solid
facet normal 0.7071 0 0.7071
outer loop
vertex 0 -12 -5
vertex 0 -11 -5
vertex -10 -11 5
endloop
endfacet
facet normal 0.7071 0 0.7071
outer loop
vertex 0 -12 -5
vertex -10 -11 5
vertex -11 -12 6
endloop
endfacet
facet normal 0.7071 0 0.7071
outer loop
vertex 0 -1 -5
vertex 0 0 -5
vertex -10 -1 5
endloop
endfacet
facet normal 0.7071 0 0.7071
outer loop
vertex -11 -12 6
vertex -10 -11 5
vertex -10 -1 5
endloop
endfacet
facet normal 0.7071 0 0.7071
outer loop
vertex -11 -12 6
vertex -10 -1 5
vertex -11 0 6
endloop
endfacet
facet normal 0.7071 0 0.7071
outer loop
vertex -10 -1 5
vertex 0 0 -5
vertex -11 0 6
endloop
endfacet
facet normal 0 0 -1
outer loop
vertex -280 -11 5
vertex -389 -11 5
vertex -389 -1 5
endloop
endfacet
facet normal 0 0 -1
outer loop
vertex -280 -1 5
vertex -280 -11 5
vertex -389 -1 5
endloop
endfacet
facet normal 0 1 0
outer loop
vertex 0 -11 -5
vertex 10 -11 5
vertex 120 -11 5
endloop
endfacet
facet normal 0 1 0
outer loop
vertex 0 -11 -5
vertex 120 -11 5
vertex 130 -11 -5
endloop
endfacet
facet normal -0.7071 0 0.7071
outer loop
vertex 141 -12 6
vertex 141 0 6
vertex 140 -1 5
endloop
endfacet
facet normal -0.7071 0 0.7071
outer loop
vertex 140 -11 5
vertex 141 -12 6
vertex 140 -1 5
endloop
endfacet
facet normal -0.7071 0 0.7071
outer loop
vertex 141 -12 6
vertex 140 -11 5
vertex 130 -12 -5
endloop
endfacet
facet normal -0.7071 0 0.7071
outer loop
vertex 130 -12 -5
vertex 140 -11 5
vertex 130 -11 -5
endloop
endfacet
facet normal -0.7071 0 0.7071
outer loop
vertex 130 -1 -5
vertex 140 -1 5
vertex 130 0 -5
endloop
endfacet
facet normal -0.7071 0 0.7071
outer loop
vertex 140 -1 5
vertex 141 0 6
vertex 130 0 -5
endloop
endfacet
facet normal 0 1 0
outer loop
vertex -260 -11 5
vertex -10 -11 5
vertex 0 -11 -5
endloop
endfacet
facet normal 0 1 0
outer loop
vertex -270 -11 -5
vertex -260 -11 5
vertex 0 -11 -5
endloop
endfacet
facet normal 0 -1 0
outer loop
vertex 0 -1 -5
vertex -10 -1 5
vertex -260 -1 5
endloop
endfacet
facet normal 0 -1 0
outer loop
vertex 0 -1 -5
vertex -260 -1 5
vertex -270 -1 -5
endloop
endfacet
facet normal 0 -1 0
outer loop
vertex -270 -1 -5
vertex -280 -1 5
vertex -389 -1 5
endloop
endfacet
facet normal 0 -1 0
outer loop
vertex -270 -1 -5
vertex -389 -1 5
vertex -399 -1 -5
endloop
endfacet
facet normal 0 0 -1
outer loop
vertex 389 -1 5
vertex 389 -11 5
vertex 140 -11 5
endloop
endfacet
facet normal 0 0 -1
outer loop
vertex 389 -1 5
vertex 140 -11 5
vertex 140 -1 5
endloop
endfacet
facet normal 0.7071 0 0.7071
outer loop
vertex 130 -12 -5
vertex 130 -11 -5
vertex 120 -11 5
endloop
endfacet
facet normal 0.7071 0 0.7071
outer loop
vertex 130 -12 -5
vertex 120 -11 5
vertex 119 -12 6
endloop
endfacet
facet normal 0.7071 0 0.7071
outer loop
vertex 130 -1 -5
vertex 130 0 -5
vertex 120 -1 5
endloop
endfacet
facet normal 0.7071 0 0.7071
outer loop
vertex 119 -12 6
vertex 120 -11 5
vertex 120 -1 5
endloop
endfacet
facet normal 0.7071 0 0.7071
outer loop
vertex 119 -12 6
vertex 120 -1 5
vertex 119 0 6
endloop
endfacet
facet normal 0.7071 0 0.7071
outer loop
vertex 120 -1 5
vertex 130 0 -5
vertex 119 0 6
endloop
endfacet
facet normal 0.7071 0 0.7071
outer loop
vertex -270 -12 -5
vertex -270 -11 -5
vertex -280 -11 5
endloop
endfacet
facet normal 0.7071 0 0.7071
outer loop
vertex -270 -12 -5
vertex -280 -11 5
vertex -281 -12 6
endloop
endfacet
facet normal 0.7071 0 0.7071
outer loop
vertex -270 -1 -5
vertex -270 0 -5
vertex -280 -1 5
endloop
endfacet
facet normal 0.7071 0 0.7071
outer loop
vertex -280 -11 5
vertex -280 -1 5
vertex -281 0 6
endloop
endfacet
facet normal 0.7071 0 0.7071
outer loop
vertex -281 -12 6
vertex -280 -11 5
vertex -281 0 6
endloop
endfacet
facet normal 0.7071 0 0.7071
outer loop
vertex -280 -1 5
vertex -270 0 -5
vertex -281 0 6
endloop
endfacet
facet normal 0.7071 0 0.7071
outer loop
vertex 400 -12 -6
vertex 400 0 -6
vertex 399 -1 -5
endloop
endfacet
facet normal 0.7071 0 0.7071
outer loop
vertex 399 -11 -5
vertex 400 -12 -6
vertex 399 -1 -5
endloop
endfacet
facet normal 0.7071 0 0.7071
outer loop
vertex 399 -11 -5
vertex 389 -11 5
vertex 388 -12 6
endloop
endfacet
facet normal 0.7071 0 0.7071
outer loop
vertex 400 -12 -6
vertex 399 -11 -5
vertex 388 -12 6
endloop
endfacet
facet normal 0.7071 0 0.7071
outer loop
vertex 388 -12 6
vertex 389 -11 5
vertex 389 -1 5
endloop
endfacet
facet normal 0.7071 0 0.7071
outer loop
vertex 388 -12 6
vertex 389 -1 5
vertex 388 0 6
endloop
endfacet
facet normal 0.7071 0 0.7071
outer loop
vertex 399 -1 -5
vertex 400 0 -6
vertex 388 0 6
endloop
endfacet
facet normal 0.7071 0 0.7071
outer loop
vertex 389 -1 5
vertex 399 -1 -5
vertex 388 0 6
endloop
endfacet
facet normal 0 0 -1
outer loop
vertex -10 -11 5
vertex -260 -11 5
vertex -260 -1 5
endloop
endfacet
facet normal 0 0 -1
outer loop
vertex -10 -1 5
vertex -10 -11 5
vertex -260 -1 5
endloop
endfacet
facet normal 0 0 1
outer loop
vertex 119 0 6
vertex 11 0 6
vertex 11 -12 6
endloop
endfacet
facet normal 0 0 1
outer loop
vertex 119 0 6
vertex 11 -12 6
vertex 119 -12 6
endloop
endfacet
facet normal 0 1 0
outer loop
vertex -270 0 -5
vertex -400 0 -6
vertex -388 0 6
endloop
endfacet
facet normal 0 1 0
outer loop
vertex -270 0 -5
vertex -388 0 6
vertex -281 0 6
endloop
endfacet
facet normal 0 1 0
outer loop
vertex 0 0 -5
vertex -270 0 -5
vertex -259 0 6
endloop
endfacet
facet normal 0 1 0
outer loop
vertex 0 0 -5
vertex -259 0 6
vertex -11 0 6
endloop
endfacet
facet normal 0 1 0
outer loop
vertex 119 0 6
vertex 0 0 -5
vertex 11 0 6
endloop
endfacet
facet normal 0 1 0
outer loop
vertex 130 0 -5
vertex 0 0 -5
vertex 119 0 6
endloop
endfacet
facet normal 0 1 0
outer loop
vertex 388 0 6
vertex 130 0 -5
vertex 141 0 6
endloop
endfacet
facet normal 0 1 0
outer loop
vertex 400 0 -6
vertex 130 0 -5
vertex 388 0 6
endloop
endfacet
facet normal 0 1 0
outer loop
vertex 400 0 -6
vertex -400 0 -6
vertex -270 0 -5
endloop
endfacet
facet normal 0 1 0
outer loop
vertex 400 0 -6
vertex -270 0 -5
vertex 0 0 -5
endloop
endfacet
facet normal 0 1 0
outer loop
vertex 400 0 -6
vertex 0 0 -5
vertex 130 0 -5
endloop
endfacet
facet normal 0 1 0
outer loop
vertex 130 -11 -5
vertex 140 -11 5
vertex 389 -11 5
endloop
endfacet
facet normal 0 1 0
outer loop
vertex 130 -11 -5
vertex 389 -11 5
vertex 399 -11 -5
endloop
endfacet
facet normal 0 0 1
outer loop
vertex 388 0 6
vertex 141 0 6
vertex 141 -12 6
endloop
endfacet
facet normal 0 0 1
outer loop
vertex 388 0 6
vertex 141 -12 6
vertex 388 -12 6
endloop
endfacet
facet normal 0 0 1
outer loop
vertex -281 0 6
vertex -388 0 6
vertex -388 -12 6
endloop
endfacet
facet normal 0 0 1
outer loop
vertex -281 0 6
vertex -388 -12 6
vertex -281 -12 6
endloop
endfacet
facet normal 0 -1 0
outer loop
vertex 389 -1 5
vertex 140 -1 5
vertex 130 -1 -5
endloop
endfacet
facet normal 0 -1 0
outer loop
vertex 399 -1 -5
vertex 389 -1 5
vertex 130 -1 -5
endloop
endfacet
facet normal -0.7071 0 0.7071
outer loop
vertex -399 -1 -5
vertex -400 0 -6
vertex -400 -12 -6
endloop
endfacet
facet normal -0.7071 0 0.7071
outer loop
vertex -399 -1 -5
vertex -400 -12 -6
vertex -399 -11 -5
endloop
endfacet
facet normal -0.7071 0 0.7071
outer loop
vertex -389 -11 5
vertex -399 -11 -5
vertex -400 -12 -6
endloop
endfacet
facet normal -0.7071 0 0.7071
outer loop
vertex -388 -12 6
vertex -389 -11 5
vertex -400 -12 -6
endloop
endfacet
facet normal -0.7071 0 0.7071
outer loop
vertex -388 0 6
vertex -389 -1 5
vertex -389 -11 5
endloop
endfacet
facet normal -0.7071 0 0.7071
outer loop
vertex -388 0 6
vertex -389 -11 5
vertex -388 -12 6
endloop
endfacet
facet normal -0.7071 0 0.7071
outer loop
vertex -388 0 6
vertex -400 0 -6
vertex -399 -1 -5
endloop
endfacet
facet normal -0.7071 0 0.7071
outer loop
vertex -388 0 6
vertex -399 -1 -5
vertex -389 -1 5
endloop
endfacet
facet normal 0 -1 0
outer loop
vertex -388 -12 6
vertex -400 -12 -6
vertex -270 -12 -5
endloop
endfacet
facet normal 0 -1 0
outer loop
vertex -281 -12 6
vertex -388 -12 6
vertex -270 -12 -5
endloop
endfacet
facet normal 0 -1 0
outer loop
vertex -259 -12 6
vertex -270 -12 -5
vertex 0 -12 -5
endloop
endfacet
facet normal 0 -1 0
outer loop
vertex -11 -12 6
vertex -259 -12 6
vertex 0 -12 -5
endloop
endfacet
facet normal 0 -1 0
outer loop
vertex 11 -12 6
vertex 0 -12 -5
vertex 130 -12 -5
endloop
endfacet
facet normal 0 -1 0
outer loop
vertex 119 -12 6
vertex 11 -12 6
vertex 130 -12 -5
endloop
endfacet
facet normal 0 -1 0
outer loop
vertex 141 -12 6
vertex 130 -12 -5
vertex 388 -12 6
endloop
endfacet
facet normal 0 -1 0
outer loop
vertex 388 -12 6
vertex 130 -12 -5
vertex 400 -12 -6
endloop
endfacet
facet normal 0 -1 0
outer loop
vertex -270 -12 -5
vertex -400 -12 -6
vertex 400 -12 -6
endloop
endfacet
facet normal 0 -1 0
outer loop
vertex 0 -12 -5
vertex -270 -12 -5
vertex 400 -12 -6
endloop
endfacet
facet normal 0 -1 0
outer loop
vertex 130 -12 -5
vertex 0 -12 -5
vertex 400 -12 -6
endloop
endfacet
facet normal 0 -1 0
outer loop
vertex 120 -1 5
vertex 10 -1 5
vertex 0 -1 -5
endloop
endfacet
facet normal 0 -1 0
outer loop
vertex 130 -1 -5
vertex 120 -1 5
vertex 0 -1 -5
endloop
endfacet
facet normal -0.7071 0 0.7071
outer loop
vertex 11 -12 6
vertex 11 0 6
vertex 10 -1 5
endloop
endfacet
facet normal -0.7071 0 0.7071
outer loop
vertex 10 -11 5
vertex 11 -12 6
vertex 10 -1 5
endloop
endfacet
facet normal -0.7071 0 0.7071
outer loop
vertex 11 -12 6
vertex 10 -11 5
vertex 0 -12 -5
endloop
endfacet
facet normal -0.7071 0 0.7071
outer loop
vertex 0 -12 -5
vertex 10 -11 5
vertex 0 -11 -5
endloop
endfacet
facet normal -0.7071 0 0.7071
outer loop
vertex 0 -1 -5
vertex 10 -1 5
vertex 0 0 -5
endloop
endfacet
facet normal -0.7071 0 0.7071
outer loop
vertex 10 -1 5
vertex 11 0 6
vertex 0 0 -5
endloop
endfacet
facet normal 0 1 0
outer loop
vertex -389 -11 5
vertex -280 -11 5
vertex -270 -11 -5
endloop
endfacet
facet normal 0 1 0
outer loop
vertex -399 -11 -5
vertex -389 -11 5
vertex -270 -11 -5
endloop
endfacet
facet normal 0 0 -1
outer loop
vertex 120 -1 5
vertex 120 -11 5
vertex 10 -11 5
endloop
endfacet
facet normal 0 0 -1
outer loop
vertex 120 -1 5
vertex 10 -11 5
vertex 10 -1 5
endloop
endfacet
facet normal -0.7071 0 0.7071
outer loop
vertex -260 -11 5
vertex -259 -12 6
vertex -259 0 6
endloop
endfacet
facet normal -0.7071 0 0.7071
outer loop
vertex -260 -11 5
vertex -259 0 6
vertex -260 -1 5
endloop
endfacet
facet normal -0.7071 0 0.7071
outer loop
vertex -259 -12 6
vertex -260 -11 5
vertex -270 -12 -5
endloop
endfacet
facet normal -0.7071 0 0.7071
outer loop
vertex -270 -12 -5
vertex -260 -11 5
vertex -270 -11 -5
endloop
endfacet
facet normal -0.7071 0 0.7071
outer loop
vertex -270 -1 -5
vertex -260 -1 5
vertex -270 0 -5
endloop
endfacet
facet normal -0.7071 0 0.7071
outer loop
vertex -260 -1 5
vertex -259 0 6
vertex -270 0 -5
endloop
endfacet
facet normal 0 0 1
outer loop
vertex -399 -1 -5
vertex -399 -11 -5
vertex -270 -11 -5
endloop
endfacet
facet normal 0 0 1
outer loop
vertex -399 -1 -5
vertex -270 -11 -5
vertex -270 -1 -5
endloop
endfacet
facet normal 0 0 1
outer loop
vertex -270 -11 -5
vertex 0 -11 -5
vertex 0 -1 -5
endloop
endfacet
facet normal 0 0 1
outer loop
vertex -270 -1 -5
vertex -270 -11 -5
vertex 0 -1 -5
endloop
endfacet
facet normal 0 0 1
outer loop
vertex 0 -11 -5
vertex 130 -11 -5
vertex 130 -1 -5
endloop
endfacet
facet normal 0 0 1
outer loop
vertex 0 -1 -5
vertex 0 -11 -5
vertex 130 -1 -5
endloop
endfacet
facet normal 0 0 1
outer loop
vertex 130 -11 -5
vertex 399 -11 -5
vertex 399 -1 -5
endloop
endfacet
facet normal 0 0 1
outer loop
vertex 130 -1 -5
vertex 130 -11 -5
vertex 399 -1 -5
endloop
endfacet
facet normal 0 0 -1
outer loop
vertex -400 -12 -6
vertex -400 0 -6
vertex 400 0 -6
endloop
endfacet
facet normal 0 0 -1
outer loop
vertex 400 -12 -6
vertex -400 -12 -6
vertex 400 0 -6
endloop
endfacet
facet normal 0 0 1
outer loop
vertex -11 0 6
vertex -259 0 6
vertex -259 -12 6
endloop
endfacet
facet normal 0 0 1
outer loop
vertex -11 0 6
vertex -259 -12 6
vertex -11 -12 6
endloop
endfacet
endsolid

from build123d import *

# Parameters (mm, degrees)
SKETCH4_W          = 800
SKETCH4_H          = 12
BASE_FLANGE1_DEPTH = 12
SKETCH9_W          = 10
SKETCH9_H          = 10
CUT_EXTRUDE2_DEPTH = 801.112492091
CUT_EXTRUDE3_DEPTH = 72


# Sheet-metal steps are written as plain solids
with BuildPart() as part:
    # Sketch4 → Base-Flange1 (new body)
    with BuildSketch(Plane(origin=(0, 0, 0), x_dir=(1, 0, 0), z_dir=(0, 1, 0))):
        Rectangle(SKETCH4_W, SKETCH4_H)
    extrude(amount=-BASE_FLANGE1_DEPTH)

    # Sketch9 → Cut-Extrude2 (cut, through all)
    with BuildSketch(Plane(origin=(400, 0, 0), x_dir=(0, 0, -1), z_dir=(1, 0, 0))):
        with Locations((0, -6)):
            Rectangle(SKETCH9_W, SKETCH9_H)
    extrude(amount=-CUT_EXTRUDE2_DEPTH, mode=Mode.SUBTRACT)

    # Sketch12 → Cut-Extrude3 (cut)
    with BuildSketch(Plane(origin=(0, 0, 0), x_dir=(1, 0, 0), z_dir=(0, 1, 0))):
        Polygon((-270, 5), (-281, -6), (-259, -6), align=None)
        Polygon((11, -6), (0, 5), (-11, -6), align=None)
        Polygon((141, -6), (130, 5), (119, -6), align=None)
        Polygon((-400, 6), (-388, -6), (-400, -6), align=None)
        Polygon((400, -6), (400, 6), (388, -6), align=None)
    extrude(amount=-CUT_EXTRUDE3_DEPTH, mode=Mode.SUBTRACT)


solid = part.part
